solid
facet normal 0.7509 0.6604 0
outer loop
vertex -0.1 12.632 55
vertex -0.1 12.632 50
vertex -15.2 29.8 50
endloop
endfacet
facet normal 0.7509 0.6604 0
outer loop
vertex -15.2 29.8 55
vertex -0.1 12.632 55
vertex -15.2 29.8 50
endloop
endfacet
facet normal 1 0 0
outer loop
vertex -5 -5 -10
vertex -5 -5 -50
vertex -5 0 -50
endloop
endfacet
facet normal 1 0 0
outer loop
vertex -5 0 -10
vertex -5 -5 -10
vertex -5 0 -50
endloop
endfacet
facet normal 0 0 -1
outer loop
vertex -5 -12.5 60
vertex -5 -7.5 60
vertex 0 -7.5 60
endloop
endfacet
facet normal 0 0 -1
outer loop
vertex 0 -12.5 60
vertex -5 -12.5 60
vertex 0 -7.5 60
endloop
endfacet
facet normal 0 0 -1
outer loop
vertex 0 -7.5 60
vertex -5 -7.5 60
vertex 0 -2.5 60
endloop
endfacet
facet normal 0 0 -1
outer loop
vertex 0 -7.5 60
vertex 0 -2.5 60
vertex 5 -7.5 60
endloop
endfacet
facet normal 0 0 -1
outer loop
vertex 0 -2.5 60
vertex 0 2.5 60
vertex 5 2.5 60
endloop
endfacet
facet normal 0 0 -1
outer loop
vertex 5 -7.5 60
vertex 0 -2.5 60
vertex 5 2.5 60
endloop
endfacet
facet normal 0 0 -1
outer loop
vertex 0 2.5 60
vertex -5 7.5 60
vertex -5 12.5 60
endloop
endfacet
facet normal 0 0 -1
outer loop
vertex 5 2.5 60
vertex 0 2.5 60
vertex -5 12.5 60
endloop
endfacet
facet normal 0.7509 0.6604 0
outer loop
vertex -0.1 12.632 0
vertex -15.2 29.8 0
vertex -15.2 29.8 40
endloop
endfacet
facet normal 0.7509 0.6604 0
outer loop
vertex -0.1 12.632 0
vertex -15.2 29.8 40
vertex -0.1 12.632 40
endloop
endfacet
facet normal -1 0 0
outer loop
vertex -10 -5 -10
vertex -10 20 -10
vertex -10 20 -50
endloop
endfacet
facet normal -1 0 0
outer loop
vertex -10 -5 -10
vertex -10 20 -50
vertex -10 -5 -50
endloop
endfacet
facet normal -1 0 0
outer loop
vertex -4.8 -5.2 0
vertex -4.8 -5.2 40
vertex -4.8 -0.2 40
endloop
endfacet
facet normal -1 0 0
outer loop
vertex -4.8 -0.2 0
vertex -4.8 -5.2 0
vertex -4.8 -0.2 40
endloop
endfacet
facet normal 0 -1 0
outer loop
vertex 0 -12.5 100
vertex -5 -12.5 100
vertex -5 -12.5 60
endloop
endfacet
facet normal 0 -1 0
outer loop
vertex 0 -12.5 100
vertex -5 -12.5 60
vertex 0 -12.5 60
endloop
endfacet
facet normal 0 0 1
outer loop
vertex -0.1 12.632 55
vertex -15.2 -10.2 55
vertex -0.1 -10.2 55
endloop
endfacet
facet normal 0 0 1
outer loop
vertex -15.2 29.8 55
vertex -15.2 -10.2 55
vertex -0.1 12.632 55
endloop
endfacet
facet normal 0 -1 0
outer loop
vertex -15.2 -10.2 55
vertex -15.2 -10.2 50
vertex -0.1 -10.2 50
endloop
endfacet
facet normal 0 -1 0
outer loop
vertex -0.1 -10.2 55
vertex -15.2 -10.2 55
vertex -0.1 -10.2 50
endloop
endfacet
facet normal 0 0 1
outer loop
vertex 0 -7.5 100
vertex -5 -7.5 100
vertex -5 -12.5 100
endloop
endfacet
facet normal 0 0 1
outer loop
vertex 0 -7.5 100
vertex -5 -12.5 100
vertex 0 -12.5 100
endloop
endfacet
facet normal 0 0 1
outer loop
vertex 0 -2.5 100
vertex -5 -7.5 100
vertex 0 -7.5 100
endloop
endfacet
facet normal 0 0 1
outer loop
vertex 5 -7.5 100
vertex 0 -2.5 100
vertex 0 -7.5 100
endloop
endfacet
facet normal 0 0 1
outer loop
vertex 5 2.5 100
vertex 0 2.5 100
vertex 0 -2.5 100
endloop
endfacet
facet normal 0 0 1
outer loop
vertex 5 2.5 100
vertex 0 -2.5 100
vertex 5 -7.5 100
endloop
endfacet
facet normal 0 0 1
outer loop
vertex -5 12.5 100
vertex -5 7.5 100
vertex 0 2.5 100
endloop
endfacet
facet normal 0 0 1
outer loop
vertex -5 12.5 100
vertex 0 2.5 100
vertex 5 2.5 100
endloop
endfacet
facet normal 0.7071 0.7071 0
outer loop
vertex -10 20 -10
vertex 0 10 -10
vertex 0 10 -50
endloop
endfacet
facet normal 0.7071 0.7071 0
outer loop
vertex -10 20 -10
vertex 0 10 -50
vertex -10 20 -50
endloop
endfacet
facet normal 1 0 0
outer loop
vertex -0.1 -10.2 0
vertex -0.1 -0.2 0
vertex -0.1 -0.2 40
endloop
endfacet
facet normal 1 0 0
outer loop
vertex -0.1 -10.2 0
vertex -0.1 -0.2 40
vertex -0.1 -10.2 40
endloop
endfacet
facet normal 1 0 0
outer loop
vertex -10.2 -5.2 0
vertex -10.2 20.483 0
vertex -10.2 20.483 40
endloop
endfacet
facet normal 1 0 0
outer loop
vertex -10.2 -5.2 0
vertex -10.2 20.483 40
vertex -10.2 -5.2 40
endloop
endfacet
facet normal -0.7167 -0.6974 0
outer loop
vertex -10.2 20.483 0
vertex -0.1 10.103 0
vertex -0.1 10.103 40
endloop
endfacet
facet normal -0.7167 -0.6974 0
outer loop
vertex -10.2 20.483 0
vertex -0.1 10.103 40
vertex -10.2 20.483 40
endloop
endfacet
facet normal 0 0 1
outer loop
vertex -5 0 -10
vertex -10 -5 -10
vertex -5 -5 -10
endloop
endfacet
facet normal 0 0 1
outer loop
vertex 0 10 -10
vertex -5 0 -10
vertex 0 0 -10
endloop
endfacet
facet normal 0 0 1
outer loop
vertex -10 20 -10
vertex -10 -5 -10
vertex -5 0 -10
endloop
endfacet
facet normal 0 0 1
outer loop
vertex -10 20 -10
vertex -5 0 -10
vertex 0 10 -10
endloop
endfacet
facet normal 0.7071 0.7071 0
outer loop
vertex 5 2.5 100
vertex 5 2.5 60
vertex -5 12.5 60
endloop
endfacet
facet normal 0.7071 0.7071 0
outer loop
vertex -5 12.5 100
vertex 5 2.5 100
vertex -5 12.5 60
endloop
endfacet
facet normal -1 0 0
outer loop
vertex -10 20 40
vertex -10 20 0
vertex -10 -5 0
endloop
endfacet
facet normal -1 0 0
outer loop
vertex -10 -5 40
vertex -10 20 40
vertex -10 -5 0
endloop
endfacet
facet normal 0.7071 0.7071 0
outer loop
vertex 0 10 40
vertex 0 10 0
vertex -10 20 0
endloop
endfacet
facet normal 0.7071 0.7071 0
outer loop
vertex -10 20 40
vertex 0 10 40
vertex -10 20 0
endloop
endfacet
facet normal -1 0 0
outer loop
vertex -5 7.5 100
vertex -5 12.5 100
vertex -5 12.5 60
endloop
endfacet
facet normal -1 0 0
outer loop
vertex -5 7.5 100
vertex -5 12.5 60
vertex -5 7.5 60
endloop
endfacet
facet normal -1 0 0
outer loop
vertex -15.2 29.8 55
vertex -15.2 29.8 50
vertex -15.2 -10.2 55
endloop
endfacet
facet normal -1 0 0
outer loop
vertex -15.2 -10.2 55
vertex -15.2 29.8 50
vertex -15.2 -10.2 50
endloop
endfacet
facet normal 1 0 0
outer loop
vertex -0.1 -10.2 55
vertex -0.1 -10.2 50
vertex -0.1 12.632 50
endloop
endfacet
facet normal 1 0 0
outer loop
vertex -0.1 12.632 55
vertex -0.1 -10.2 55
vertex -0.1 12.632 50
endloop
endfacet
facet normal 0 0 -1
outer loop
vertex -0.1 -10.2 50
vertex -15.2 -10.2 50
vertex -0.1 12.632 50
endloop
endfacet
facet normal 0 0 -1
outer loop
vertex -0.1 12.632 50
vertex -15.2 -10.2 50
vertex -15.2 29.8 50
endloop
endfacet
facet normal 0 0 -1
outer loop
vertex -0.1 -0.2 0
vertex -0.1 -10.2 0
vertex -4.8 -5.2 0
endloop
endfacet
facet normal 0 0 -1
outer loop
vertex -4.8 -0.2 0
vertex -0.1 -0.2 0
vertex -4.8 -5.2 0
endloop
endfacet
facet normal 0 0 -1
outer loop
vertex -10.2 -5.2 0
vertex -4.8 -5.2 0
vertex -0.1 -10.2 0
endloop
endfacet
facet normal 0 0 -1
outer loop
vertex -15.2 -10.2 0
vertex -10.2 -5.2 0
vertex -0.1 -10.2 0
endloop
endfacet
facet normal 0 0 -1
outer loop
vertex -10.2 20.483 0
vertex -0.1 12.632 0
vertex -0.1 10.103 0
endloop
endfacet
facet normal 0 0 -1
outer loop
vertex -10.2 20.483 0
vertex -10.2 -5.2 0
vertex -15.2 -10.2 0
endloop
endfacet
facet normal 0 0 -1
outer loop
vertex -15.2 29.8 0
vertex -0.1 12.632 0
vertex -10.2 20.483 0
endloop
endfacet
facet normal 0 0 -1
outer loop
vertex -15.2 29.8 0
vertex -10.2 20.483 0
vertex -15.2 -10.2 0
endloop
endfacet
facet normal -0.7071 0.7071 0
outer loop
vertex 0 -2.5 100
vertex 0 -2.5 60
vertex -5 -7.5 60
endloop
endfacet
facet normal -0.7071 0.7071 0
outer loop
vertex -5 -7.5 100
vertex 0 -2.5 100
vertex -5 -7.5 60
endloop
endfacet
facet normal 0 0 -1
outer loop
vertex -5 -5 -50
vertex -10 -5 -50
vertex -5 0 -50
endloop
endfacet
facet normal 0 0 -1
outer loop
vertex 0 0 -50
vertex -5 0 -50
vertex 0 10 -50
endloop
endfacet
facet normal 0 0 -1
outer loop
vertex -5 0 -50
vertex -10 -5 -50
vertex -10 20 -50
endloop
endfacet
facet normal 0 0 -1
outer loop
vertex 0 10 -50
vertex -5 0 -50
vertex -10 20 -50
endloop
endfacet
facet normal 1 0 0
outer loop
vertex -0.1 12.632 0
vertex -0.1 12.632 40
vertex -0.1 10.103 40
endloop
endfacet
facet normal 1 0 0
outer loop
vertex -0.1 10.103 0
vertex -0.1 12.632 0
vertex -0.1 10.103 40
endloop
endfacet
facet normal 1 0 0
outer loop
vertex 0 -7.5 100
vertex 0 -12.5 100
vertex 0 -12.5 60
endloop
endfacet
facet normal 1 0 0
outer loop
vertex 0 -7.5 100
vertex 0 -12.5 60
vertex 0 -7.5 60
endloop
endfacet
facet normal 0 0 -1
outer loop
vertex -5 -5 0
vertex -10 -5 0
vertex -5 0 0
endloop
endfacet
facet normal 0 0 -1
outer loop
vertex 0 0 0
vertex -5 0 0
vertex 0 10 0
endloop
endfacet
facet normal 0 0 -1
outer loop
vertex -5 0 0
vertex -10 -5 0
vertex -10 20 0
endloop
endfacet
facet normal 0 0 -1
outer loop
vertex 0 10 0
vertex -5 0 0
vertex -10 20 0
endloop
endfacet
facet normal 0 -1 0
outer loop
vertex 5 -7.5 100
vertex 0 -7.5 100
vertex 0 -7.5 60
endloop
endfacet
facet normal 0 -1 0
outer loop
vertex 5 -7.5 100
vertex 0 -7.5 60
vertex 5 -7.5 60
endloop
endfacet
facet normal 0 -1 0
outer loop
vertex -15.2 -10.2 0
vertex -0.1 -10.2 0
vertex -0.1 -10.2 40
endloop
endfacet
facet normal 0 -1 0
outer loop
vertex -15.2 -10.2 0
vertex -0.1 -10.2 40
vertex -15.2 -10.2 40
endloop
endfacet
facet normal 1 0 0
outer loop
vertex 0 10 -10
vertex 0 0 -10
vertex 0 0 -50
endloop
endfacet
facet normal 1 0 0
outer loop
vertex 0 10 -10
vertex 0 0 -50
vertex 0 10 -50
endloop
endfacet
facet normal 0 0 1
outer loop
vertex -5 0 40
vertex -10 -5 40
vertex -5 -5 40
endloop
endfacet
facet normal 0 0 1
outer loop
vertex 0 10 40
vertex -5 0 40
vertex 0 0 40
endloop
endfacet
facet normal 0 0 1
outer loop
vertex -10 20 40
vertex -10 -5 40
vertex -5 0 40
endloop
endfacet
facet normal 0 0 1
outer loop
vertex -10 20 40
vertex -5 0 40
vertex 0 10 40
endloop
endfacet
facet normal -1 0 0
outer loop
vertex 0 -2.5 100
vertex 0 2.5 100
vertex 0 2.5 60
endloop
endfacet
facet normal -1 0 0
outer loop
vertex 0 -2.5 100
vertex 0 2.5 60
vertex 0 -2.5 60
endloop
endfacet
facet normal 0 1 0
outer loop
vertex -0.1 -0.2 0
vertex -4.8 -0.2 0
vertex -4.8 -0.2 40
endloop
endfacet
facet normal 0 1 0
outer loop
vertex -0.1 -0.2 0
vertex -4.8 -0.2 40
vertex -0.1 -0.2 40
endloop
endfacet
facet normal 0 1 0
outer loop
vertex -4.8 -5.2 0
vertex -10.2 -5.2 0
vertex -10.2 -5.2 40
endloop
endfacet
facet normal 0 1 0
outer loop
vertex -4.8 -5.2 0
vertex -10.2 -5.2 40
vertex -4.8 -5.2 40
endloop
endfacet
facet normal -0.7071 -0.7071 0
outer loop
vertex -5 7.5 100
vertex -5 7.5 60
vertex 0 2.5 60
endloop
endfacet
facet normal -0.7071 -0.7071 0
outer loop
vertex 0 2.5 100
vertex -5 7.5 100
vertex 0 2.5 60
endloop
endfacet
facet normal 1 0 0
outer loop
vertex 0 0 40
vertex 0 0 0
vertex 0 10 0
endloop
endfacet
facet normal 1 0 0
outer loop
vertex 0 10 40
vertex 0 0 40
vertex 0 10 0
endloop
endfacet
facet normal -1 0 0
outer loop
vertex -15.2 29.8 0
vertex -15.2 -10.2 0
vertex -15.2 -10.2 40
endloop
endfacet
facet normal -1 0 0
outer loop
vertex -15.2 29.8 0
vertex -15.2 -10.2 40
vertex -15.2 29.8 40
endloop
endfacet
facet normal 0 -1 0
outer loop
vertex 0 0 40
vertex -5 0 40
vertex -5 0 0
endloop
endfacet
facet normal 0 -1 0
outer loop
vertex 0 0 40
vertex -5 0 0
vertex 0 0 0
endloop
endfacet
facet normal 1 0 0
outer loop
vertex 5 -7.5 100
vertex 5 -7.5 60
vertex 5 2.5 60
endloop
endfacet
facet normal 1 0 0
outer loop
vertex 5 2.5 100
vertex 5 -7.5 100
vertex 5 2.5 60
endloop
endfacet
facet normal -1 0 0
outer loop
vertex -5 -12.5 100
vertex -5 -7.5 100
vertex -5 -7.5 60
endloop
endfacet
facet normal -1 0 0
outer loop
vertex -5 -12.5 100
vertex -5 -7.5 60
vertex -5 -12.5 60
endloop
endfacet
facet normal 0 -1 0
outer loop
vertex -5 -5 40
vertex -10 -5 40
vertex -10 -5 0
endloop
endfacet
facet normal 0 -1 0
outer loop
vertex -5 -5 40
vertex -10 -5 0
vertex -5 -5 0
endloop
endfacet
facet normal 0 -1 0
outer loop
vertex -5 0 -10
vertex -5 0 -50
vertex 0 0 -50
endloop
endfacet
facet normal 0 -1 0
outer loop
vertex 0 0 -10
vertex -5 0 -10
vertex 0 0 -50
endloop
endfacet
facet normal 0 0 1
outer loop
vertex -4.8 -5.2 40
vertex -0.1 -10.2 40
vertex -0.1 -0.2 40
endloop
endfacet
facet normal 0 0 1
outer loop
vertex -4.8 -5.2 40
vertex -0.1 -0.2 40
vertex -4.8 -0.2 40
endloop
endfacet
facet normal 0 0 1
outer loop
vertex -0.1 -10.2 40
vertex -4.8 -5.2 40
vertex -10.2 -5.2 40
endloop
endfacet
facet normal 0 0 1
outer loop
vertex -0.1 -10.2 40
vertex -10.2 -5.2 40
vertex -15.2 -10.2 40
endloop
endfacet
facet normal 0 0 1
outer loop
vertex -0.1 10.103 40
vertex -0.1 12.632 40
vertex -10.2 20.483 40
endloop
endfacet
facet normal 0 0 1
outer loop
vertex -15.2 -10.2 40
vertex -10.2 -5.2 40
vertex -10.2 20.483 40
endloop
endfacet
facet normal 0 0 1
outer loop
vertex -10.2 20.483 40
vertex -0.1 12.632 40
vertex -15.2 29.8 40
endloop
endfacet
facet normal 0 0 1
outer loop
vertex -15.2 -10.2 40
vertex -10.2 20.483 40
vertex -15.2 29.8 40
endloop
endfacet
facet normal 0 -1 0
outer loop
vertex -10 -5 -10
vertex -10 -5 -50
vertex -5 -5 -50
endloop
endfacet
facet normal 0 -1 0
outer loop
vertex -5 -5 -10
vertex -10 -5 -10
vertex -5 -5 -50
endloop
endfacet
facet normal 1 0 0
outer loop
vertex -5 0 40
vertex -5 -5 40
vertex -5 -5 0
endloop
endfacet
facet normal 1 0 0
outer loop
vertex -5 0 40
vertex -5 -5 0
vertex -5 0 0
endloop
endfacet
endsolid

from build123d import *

# Parameters (mm, degrees)
BOSS_EXTRUDE2_DEPTH = 40
BOSS_EXTRUDE3_DEPTH = 40
BOSS_EXTRUDE4_DEPTH = 5
BOSS_EXTRUDE6_DEPTH = 40
BOSS_EXTRUDE7_DEPTH = 40


with BuildPart() as part:
    # female → Boss-Extrude2 (new body)
    with BuildSketch(Plane.XY):
        Polygon((-0.1, -0.2), (-0.1, -10.2), (-15.2, -10.2), (-15.2, 29.8), (-0.1, 12.631933622), (-0.1, 10.102772968), (-10.2, 20.482842712), (-10.2, -5.2), (-4.8, -5.2), (-4.8, -0.2), align=None)
    extrude(amount=BOSS_EXTRUDE2_DEPTH)


with BuildPart() as body_2:
    # male_FULL → Boss-Extrude3 (new body)
    with BuildSketch(Plane.XY):
        Polygon((0, 0), (0, 10), (-10, 20), (-10, -5), (-5, -5), (-5, 0), align=None)
    extrude(amount=BOSS_EXTRUDE3_DEPTH)


with BuildPart() as body_3:
    # female_stop → Boss-Extrude4 (new body)
    with BuildSketch(Plane.XY.offset(50)):
        Polygon((-0.1, -0.2), (-0.1, 10.102772968), (-0.1, 12.631933622), (-15.2, 29.8), (-15.2, -10.2), (-0.1, -10.2), align=None)
    extrude(amount=BOSS_EXTRUDE4_DEPTH)


with BuildPart() as body_4:
    # Sketch6 → Boss-Extrude6 (new body)
    with BuildSketch(Plane.XY.offset(60)):
        Polygon((5, 2.5), (-5, 12.5), (-5, 7.5), (0, 2.5), (0, -2.5), (-5, -7.5), (-5, -12.5), (0, -12.5), (0, -7.5), (5, -7.5), align=None)
    extrude(amount=BOSS_EXTRUDE6_DEPTH)


with BuildPart() as body_5:
    # Sketch7 → Boss-Extrude7 (new body)
    with BuildSketch(Plane(origin=(0, 0, -10), x_dir=(-1, 0, 0), z_dir=(0, 0, -1))):
        Polygon((0, 0), (0, 10), (10, 20), (10, -5), (5, -5), (5, 0), align=None)
    extrude(amount=BOSS_EXTRUDE7_DEPTH)


solid = Compound([part.part, body_2.part, body_3.part, body_4.part, body_5.part])
